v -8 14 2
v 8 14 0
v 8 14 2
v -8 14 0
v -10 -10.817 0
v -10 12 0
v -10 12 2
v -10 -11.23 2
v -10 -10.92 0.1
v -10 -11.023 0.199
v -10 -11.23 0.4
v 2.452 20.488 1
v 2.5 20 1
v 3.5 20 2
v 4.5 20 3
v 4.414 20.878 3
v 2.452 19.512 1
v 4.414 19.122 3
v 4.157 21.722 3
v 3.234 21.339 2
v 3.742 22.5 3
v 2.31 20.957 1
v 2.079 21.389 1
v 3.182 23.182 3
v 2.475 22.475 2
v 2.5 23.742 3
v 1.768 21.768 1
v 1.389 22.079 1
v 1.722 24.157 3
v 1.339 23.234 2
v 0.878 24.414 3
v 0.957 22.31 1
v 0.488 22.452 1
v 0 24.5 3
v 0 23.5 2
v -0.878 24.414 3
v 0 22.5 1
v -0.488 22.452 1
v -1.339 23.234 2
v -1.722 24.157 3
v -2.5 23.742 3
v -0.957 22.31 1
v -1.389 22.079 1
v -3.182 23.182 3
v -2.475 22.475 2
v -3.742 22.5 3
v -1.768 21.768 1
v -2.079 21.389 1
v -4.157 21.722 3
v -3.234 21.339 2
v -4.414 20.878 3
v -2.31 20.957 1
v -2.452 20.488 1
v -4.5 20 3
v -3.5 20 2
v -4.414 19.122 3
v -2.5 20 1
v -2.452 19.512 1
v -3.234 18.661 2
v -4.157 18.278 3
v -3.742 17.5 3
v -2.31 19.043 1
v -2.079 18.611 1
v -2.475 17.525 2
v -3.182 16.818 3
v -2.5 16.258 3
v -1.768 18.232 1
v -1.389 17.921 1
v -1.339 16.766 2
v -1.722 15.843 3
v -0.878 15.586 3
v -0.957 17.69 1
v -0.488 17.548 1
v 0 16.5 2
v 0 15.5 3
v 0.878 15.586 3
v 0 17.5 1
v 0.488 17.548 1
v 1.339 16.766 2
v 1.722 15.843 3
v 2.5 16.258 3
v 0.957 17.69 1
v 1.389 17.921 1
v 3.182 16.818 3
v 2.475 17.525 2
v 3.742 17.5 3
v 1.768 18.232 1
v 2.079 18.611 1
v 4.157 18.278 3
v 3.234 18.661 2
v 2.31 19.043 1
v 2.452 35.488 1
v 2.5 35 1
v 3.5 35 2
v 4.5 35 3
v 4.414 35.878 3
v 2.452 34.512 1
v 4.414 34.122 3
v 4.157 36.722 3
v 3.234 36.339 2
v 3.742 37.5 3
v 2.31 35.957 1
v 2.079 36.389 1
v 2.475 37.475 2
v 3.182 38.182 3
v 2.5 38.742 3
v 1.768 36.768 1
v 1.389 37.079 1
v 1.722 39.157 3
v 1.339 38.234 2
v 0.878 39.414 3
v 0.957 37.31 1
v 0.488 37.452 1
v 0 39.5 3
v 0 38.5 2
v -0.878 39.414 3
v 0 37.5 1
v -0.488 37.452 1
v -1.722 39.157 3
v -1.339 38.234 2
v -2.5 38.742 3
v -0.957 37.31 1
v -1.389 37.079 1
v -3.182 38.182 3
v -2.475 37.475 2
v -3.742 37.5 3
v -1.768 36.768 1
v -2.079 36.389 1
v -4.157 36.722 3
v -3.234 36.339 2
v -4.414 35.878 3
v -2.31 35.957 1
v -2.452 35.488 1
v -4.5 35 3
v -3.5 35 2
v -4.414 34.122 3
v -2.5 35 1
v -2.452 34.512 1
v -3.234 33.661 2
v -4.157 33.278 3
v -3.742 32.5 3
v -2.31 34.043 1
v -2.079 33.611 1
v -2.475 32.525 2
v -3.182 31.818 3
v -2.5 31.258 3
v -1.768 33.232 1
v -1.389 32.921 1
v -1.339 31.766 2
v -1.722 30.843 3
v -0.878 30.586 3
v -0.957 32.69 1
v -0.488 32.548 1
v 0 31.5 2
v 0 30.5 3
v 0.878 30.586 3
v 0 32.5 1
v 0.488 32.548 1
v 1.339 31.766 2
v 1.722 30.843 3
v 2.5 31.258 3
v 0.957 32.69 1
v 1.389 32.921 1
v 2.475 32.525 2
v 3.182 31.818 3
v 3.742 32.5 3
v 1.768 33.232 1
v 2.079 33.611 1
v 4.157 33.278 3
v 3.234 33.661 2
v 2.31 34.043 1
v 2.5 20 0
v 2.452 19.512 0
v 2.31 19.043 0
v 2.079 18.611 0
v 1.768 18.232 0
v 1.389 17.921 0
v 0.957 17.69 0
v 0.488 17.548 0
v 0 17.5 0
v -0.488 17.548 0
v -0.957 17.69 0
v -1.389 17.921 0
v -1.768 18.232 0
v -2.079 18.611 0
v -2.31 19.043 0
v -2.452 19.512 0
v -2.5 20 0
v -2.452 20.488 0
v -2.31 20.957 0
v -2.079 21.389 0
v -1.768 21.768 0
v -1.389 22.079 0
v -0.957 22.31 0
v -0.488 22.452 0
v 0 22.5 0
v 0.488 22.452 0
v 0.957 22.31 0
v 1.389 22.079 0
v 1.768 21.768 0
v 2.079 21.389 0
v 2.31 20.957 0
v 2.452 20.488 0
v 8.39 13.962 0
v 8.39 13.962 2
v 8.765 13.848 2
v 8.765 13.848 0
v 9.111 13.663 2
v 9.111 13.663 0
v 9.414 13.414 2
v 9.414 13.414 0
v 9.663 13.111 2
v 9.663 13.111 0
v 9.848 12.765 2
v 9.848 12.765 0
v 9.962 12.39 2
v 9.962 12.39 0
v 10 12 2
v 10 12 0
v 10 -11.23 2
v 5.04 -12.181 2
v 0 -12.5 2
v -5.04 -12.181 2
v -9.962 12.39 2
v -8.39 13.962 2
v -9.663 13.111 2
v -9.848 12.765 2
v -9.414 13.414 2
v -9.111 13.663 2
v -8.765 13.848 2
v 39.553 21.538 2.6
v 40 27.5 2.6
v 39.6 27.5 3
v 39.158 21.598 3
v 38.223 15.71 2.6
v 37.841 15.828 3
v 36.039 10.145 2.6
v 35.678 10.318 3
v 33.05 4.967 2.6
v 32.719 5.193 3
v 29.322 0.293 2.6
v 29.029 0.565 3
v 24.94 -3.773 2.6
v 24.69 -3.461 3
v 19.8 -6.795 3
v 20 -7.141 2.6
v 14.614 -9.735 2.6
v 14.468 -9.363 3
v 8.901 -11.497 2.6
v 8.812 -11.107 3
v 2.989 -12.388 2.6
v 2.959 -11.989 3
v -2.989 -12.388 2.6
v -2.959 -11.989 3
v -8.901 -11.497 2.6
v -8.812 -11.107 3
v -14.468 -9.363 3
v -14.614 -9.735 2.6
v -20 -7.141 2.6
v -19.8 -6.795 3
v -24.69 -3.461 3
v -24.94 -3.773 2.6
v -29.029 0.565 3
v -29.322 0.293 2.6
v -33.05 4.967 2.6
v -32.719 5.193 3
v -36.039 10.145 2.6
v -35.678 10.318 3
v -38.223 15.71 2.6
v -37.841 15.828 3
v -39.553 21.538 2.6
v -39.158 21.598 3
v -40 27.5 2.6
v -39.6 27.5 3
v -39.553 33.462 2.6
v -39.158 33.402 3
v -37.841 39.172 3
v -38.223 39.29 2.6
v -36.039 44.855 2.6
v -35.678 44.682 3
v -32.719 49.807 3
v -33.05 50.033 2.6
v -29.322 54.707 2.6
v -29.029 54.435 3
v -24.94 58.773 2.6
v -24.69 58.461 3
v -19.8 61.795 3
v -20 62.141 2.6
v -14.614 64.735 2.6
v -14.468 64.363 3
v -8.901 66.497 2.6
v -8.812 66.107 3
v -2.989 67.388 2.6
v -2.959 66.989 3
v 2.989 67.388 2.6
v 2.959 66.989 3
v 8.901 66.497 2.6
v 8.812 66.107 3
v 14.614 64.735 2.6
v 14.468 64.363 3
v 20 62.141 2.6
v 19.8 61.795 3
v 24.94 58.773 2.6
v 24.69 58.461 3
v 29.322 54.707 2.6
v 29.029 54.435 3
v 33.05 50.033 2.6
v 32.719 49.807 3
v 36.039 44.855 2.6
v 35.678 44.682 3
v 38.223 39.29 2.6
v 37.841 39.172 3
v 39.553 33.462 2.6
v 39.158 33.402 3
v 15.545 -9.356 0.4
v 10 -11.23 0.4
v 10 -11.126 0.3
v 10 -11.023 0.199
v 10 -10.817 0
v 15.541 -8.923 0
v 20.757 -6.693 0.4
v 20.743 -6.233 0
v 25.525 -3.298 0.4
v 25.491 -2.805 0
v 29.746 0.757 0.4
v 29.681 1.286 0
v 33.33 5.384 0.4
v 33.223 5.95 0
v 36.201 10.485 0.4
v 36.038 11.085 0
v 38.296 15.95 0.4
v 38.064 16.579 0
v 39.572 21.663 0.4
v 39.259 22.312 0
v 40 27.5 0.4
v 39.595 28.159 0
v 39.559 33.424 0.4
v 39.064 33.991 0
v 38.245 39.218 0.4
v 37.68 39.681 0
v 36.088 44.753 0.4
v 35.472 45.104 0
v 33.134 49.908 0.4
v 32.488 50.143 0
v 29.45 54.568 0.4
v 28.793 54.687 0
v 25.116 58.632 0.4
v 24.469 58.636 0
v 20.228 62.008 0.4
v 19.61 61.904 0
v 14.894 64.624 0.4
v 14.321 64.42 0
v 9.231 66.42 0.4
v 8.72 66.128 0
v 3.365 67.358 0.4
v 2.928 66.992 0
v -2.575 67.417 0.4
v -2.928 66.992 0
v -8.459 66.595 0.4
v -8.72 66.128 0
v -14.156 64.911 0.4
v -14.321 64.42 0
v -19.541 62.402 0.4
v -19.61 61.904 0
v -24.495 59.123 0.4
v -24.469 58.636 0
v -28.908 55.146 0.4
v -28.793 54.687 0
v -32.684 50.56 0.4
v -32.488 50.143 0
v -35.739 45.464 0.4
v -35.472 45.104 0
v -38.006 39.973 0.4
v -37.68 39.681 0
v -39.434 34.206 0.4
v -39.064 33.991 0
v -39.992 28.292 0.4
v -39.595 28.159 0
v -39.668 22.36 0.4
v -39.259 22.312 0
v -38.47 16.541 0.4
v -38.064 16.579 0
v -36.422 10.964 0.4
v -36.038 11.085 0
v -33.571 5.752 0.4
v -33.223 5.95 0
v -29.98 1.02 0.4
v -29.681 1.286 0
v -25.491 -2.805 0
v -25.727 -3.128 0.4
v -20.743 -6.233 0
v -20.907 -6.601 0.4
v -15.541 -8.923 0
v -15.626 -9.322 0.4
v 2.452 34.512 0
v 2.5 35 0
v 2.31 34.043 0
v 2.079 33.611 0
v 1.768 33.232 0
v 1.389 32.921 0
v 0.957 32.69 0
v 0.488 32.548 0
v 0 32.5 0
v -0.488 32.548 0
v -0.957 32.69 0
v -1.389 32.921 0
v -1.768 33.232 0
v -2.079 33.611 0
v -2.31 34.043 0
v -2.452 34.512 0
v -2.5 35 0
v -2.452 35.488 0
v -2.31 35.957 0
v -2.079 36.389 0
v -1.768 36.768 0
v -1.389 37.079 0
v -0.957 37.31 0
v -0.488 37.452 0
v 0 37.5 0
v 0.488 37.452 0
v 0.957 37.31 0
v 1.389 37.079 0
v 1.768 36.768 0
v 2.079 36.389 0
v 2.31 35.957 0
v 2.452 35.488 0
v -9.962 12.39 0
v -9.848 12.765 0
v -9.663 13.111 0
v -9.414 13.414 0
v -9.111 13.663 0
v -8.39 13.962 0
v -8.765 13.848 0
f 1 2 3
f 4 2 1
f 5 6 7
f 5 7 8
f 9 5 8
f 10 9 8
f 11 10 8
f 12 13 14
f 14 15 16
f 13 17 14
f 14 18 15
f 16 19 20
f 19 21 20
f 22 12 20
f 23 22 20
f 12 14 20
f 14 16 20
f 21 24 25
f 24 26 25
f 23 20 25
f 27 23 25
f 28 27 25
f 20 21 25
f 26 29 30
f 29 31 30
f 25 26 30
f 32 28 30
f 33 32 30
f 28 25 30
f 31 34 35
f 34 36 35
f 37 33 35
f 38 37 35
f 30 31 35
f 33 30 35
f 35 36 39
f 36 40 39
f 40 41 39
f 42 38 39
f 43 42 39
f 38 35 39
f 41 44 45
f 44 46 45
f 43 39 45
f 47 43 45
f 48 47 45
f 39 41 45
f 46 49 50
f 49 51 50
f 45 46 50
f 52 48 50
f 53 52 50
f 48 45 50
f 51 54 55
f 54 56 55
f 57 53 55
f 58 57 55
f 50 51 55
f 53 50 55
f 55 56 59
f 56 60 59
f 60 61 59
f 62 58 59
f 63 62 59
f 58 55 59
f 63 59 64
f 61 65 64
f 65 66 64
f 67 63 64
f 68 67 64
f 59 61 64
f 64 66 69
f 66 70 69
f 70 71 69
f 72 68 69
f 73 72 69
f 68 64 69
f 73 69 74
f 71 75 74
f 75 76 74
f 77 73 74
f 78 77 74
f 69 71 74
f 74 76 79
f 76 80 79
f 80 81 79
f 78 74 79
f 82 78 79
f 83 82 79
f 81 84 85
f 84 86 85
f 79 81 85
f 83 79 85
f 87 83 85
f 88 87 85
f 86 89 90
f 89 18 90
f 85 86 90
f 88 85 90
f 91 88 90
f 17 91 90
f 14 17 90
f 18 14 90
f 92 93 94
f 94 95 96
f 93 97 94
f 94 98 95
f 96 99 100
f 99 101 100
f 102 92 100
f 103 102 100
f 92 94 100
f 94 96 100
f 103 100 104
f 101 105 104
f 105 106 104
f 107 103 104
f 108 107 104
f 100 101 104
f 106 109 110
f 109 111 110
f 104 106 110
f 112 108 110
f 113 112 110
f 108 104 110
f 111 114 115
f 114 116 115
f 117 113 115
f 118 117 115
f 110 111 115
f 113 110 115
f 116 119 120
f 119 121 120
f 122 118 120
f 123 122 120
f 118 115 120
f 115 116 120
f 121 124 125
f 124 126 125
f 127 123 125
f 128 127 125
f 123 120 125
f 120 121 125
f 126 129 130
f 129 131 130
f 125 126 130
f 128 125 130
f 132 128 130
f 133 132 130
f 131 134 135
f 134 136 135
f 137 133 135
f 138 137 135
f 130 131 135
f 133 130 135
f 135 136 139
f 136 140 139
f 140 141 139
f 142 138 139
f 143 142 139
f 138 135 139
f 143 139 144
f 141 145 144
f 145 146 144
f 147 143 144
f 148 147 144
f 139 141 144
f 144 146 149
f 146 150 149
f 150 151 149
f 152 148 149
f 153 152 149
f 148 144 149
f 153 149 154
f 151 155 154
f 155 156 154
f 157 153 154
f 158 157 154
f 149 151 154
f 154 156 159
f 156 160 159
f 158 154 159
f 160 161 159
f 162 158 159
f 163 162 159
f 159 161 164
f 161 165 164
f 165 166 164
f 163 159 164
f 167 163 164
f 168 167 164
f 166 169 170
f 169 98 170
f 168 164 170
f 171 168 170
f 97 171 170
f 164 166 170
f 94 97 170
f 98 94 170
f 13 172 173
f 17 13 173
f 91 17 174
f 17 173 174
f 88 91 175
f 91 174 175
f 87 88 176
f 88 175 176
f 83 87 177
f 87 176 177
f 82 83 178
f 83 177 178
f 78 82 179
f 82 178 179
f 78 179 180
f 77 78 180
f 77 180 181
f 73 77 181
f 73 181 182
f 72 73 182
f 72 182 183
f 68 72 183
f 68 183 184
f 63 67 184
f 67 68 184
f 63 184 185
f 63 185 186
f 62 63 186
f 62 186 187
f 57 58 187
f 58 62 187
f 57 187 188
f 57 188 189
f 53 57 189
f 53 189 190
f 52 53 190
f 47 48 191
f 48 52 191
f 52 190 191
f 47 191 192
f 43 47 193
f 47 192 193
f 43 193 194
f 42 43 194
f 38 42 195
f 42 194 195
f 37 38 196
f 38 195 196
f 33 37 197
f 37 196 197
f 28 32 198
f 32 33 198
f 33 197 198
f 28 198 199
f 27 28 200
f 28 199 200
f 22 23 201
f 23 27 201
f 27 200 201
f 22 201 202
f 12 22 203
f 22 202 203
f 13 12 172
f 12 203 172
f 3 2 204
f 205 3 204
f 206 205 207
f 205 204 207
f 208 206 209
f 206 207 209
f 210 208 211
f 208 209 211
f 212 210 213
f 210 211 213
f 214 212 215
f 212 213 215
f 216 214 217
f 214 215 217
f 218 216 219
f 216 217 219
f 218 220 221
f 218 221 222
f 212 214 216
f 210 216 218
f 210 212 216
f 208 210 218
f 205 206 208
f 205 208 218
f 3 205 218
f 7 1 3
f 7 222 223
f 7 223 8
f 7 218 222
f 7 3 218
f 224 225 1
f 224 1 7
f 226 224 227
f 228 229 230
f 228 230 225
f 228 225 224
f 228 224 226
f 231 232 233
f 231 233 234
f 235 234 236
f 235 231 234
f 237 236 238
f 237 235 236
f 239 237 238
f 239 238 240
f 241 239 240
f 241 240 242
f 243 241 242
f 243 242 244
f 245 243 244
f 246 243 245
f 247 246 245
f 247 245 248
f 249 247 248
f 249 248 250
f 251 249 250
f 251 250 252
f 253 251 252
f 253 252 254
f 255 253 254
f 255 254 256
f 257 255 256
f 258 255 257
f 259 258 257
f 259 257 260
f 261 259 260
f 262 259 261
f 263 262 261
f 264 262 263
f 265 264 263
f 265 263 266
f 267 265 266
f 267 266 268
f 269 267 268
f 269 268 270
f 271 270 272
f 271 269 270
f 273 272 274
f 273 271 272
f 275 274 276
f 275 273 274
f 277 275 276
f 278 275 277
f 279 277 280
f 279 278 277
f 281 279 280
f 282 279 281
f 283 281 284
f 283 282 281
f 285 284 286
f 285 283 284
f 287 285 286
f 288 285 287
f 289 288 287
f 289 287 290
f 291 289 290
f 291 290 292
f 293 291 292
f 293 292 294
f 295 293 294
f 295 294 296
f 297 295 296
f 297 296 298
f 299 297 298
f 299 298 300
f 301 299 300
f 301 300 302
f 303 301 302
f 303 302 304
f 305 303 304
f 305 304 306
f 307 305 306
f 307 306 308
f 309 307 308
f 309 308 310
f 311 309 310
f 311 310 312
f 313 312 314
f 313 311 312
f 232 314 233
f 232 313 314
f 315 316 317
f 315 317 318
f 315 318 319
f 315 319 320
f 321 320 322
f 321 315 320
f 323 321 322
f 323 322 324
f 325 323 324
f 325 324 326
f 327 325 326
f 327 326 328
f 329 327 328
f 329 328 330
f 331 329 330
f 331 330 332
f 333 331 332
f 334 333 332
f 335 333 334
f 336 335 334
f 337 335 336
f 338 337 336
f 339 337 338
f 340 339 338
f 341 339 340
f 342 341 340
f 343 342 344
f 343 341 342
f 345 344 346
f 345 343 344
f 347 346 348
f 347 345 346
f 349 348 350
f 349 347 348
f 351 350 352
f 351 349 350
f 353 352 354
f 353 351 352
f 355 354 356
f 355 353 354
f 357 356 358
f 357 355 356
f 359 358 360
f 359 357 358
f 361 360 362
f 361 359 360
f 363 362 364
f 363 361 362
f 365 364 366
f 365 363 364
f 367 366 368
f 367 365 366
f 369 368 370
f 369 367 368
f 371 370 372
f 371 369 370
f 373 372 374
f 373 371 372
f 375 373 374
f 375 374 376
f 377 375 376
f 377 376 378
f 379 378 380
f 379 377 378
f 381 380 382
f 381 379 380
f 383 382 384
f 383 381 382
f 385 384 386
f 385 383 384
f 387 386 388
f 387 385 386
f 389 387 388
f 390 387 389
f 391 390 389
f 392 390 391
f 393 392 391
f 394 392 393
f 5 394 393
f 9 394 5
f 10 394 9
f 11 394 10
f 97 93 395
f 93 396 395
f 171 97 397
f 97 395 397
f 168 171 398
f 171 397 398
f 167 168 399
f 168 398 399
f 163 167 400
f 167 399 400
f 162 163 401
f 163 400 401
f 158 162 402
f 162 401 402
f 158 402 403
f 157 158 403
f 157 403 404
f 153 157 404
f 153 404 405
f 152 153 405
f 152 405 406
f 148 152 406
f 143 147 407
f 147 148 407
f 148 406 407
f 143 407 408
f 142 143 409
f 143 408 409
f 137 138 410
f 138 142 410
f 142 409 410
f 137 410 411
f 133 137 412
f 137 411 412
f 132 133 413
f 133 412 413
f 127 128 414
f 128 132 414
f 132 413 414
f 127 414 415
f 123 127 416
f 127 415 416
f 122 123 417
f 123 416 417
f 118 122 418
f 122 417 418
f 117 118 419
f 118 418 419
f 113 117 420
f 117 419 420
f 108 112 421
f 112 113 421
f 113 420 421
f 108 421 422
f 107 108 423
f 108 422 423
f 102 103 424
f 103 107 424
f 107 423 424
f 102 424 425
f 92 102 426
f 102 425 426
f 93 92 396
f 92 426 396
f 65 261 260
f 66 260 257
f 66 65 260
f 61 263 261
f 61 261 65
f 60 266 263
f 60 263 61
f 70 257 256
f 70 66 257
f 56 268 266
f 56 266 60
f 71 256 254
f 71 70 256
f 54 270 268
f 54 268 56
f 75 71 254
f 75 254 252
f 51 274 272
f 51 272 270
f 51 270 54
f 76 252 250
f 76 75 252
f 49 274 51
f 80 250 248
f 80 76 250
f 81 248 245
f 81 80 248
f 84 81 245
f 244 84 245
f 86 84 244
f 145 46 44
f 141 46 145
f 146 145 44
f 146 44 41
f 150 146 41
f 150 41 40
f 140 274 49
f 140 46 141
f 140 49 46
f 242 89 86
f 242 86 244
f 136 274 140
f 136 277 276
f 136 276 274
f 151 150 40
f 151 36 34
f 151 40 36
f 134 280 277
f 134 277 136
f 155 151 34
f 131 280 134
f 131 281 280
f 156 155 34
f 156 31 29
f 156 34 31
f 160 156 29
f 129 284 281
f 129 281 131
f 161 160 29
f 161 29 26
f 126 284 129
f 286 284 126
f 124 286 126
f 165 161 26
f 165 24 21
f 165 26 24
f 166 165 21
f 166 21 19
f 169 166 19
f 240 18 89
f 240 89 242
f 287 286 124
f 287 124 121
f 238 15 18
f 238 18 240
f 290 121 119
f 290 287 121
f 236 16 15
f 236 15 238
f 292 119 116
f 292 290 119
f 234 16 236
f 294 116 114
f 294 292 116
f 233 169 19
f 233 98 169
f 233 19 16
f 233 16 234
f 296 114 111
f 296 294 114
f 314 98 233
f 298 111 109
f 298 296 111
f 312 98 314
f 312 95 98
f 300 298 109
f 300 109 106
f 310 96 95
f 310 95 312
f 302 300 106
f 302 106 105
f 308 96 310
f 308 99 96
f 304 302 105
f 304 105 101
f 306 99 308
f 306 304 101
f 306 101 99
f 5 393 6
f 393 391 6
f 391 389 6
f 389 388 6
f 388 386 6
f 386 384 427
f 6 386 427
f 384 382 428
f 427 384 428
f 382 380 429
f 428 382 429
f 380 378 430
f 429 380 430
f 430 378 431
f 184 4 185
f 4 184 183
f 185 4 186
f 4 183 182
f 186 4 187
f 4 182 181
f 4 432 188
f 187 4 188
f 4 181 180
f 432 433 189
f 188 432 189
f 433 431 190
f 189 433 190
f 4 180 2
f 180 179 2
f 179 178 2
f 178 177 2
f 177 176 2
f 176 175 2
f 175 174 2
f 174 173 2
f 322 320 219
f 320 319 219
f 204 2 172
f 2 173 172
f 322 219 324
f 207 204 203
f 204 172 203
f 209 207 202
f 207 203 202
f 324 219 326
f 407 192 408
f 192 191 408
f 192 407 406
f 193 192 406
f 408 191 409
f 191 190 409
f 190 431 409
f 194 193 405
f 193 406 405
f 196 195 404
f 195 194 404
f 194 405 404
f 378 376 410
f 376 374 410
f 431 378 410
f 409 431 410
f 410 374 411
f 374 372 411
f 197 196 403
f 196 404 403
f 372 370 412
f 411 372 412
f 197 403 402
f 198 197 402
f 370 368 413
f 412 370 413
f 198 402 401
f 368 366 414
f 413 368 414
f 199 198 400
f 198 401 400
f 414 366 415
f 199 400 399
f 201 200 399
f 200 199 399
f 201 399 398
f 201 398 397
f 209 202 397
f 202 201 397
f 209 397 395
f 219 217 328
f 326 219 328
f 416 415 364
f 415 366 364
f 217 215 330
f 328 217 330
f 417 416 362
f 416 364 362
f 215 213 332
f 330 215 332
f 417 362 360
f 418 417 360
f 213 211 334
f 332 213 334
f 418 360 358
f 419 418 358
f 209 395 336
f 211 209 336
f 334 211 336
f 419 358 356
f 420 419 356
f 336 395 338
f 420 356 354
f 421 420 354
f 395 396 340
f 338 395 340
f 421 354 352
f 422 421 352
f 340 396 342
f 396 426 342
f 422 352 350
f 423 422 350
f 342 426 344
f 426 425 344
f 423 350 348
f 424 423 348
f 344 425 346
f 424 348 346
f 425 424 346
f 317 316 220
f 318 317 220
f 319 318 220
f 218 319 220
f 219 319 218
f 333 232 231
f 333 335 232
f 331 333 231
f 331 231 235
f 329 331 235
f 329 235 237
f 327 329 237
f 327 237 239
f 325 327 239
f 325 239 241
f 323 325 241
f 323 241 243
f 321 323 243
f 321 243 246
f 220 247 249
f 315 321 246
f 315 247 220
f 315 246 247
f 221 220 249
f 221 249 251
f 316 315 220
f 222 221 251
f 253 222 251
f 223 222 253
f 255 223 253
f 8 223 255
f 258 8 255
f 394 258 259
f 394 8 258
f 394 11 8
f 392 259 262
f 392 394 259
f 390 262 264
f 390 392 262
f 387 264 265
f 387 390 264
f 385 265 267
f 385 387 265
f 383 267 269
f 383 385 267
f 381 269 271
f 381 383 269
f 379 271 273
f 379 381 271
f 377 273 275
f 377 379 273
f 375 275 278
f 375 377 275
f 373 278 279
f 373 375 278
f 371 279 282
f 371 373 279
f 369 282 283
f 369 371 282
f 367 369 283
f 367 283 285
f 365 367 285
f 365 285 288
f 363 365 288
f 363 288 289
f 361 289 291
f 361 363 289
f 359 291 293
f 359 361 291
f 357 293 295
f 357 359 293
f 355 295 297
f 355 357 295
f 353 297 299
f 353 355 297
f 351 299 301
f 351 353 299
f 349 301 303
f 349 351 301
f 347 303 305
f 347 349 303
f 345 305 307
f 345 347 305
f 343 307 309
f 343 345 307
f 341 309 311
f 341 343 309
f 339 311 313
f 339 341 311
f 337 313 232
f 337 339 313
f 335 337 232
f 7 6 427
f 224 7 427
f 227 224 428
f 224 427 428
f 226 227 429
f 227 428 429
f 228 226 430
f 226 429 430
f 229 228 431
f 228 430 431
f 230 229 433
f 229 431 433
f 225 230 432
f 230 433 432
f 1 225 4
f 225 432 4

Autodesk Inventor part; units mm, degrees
ref_plane "YZ Plane" through (0, 0, 0) normal (1, 0, 0) x (0, 1, 0)
ref_plane "XZ Plane" through (0, 0, 0) normal (0, 1, 0) x (-1, 0, 0)
ref_plane "XY Plane" through (0, 0, 0) normal (0, 0, 1) x (1, 0, 0)
ref_plane "Płaszczyzna konstrukcyjna1" through (0, 0, 0) normal (0, 0, 1) x (1, 0, 0)
sketch "Szkic1" plane through (0, 0, 0) normal (0, 0, 1) x (1, 0, 0)
  circle A0 centre (0, 20) radius 2.5 projected
  circle A1 centre (0, 35) radius 2.5 projected
  circle A2 centre (0, 27.5) radius 40
  point P0 (0, 0)
  dimension "d0" = 7.5
  dimension "d1" = 7.5
  dimension "d2" = 80
extrude "Wyciągnięcie proste1" add sketch "Szkic1" along normal blind 3
chamfer "Faza1" distance 0.4 angle 45 2 edges at (-40, 27.5, 3) (-40, 27.5, 0)
chamfer "Faza3" distance 2 angle 45 2 edges at (-2.5, 20, 3) (-2.5, 35, 3)
sketch "Szkic2" plane through (0, 27.5, 0) normal (0, 0, -1) x (-1, 0, 0)
  circle A0 centre (0, 7.5) radius 2.5 projected
  circle A1 centre (0, -7.5) radius 2.5 projected
  circle A2 centre (0, -47.5) radius 2 projected
  circle A3 centre (0, -62.5) radius 2 projected
  line L0 (6.05, 12.2) -> (6.05, -67.2) projected
  line L1 (-6.05, 12.2) -> (6.05, 12.2) projected
  line L2 (-6.05, -67.2) -> (-6.05, 12.2) projected
  line L3 (6.05, -67.2) -> (-6.05, -67.2) projected
  circle A4 centre (0, 7.5) radius 2.5 projected
  circle A5 centre (0, -7.5) radius 2.5 projected
  circle A6 centre (0, -47.5) radius 2 projected
  circle A7 centre (0, -62.5) radius 2 projected
  line L4 (6.05, 12.2) -> (6.05, -67.2) projected
  line L5 (-6.05, 12.2) -> (6.05, 12.2) projected
  line L6 (-6.05, -67.2) -> (-6.05, 12.2) projected
  line L7 (6.05, -67.2) -> (-6.05, -67.2) projected
  line L8 (10, -41.5) -> (-10, -41.5)
  line L9 (-10, -41.5) -> (-10, -15.5)
  line L10 (-8, -13.5) -> (8, -13.5)
  line L11 (10, -15.5) -> (10, -41.5)
  line L12 (10, -41.5) -> (-10, -13.5) construction
  line L13 (-10, -41.5) -> (10, -13.5) construction
  arc A8 (-8, -13.5) -> (-10, -15.5) centre (-8, -15.5) ccw
  arc A9 (10, -15.5) -> (8, -13.5) centre (8, -15.5) ccw
  point P0 (0, -27.5)
  point P1 (0, -27.5)
  dimension "d14" = 20
  dimension "d15" = 28
  dimension "d16" = 20
  dimension "d17" = 2
extrude "Wyciągnięcie proste2" cut sketch "Szkic2" against normal blind 2 contours L10 A9 L11 L8 L0 | L0 L8 L2 L10 | L2 L8 L9 A8 L10
properties part number "szklo" material "Akrylowy, przezroczysty"
